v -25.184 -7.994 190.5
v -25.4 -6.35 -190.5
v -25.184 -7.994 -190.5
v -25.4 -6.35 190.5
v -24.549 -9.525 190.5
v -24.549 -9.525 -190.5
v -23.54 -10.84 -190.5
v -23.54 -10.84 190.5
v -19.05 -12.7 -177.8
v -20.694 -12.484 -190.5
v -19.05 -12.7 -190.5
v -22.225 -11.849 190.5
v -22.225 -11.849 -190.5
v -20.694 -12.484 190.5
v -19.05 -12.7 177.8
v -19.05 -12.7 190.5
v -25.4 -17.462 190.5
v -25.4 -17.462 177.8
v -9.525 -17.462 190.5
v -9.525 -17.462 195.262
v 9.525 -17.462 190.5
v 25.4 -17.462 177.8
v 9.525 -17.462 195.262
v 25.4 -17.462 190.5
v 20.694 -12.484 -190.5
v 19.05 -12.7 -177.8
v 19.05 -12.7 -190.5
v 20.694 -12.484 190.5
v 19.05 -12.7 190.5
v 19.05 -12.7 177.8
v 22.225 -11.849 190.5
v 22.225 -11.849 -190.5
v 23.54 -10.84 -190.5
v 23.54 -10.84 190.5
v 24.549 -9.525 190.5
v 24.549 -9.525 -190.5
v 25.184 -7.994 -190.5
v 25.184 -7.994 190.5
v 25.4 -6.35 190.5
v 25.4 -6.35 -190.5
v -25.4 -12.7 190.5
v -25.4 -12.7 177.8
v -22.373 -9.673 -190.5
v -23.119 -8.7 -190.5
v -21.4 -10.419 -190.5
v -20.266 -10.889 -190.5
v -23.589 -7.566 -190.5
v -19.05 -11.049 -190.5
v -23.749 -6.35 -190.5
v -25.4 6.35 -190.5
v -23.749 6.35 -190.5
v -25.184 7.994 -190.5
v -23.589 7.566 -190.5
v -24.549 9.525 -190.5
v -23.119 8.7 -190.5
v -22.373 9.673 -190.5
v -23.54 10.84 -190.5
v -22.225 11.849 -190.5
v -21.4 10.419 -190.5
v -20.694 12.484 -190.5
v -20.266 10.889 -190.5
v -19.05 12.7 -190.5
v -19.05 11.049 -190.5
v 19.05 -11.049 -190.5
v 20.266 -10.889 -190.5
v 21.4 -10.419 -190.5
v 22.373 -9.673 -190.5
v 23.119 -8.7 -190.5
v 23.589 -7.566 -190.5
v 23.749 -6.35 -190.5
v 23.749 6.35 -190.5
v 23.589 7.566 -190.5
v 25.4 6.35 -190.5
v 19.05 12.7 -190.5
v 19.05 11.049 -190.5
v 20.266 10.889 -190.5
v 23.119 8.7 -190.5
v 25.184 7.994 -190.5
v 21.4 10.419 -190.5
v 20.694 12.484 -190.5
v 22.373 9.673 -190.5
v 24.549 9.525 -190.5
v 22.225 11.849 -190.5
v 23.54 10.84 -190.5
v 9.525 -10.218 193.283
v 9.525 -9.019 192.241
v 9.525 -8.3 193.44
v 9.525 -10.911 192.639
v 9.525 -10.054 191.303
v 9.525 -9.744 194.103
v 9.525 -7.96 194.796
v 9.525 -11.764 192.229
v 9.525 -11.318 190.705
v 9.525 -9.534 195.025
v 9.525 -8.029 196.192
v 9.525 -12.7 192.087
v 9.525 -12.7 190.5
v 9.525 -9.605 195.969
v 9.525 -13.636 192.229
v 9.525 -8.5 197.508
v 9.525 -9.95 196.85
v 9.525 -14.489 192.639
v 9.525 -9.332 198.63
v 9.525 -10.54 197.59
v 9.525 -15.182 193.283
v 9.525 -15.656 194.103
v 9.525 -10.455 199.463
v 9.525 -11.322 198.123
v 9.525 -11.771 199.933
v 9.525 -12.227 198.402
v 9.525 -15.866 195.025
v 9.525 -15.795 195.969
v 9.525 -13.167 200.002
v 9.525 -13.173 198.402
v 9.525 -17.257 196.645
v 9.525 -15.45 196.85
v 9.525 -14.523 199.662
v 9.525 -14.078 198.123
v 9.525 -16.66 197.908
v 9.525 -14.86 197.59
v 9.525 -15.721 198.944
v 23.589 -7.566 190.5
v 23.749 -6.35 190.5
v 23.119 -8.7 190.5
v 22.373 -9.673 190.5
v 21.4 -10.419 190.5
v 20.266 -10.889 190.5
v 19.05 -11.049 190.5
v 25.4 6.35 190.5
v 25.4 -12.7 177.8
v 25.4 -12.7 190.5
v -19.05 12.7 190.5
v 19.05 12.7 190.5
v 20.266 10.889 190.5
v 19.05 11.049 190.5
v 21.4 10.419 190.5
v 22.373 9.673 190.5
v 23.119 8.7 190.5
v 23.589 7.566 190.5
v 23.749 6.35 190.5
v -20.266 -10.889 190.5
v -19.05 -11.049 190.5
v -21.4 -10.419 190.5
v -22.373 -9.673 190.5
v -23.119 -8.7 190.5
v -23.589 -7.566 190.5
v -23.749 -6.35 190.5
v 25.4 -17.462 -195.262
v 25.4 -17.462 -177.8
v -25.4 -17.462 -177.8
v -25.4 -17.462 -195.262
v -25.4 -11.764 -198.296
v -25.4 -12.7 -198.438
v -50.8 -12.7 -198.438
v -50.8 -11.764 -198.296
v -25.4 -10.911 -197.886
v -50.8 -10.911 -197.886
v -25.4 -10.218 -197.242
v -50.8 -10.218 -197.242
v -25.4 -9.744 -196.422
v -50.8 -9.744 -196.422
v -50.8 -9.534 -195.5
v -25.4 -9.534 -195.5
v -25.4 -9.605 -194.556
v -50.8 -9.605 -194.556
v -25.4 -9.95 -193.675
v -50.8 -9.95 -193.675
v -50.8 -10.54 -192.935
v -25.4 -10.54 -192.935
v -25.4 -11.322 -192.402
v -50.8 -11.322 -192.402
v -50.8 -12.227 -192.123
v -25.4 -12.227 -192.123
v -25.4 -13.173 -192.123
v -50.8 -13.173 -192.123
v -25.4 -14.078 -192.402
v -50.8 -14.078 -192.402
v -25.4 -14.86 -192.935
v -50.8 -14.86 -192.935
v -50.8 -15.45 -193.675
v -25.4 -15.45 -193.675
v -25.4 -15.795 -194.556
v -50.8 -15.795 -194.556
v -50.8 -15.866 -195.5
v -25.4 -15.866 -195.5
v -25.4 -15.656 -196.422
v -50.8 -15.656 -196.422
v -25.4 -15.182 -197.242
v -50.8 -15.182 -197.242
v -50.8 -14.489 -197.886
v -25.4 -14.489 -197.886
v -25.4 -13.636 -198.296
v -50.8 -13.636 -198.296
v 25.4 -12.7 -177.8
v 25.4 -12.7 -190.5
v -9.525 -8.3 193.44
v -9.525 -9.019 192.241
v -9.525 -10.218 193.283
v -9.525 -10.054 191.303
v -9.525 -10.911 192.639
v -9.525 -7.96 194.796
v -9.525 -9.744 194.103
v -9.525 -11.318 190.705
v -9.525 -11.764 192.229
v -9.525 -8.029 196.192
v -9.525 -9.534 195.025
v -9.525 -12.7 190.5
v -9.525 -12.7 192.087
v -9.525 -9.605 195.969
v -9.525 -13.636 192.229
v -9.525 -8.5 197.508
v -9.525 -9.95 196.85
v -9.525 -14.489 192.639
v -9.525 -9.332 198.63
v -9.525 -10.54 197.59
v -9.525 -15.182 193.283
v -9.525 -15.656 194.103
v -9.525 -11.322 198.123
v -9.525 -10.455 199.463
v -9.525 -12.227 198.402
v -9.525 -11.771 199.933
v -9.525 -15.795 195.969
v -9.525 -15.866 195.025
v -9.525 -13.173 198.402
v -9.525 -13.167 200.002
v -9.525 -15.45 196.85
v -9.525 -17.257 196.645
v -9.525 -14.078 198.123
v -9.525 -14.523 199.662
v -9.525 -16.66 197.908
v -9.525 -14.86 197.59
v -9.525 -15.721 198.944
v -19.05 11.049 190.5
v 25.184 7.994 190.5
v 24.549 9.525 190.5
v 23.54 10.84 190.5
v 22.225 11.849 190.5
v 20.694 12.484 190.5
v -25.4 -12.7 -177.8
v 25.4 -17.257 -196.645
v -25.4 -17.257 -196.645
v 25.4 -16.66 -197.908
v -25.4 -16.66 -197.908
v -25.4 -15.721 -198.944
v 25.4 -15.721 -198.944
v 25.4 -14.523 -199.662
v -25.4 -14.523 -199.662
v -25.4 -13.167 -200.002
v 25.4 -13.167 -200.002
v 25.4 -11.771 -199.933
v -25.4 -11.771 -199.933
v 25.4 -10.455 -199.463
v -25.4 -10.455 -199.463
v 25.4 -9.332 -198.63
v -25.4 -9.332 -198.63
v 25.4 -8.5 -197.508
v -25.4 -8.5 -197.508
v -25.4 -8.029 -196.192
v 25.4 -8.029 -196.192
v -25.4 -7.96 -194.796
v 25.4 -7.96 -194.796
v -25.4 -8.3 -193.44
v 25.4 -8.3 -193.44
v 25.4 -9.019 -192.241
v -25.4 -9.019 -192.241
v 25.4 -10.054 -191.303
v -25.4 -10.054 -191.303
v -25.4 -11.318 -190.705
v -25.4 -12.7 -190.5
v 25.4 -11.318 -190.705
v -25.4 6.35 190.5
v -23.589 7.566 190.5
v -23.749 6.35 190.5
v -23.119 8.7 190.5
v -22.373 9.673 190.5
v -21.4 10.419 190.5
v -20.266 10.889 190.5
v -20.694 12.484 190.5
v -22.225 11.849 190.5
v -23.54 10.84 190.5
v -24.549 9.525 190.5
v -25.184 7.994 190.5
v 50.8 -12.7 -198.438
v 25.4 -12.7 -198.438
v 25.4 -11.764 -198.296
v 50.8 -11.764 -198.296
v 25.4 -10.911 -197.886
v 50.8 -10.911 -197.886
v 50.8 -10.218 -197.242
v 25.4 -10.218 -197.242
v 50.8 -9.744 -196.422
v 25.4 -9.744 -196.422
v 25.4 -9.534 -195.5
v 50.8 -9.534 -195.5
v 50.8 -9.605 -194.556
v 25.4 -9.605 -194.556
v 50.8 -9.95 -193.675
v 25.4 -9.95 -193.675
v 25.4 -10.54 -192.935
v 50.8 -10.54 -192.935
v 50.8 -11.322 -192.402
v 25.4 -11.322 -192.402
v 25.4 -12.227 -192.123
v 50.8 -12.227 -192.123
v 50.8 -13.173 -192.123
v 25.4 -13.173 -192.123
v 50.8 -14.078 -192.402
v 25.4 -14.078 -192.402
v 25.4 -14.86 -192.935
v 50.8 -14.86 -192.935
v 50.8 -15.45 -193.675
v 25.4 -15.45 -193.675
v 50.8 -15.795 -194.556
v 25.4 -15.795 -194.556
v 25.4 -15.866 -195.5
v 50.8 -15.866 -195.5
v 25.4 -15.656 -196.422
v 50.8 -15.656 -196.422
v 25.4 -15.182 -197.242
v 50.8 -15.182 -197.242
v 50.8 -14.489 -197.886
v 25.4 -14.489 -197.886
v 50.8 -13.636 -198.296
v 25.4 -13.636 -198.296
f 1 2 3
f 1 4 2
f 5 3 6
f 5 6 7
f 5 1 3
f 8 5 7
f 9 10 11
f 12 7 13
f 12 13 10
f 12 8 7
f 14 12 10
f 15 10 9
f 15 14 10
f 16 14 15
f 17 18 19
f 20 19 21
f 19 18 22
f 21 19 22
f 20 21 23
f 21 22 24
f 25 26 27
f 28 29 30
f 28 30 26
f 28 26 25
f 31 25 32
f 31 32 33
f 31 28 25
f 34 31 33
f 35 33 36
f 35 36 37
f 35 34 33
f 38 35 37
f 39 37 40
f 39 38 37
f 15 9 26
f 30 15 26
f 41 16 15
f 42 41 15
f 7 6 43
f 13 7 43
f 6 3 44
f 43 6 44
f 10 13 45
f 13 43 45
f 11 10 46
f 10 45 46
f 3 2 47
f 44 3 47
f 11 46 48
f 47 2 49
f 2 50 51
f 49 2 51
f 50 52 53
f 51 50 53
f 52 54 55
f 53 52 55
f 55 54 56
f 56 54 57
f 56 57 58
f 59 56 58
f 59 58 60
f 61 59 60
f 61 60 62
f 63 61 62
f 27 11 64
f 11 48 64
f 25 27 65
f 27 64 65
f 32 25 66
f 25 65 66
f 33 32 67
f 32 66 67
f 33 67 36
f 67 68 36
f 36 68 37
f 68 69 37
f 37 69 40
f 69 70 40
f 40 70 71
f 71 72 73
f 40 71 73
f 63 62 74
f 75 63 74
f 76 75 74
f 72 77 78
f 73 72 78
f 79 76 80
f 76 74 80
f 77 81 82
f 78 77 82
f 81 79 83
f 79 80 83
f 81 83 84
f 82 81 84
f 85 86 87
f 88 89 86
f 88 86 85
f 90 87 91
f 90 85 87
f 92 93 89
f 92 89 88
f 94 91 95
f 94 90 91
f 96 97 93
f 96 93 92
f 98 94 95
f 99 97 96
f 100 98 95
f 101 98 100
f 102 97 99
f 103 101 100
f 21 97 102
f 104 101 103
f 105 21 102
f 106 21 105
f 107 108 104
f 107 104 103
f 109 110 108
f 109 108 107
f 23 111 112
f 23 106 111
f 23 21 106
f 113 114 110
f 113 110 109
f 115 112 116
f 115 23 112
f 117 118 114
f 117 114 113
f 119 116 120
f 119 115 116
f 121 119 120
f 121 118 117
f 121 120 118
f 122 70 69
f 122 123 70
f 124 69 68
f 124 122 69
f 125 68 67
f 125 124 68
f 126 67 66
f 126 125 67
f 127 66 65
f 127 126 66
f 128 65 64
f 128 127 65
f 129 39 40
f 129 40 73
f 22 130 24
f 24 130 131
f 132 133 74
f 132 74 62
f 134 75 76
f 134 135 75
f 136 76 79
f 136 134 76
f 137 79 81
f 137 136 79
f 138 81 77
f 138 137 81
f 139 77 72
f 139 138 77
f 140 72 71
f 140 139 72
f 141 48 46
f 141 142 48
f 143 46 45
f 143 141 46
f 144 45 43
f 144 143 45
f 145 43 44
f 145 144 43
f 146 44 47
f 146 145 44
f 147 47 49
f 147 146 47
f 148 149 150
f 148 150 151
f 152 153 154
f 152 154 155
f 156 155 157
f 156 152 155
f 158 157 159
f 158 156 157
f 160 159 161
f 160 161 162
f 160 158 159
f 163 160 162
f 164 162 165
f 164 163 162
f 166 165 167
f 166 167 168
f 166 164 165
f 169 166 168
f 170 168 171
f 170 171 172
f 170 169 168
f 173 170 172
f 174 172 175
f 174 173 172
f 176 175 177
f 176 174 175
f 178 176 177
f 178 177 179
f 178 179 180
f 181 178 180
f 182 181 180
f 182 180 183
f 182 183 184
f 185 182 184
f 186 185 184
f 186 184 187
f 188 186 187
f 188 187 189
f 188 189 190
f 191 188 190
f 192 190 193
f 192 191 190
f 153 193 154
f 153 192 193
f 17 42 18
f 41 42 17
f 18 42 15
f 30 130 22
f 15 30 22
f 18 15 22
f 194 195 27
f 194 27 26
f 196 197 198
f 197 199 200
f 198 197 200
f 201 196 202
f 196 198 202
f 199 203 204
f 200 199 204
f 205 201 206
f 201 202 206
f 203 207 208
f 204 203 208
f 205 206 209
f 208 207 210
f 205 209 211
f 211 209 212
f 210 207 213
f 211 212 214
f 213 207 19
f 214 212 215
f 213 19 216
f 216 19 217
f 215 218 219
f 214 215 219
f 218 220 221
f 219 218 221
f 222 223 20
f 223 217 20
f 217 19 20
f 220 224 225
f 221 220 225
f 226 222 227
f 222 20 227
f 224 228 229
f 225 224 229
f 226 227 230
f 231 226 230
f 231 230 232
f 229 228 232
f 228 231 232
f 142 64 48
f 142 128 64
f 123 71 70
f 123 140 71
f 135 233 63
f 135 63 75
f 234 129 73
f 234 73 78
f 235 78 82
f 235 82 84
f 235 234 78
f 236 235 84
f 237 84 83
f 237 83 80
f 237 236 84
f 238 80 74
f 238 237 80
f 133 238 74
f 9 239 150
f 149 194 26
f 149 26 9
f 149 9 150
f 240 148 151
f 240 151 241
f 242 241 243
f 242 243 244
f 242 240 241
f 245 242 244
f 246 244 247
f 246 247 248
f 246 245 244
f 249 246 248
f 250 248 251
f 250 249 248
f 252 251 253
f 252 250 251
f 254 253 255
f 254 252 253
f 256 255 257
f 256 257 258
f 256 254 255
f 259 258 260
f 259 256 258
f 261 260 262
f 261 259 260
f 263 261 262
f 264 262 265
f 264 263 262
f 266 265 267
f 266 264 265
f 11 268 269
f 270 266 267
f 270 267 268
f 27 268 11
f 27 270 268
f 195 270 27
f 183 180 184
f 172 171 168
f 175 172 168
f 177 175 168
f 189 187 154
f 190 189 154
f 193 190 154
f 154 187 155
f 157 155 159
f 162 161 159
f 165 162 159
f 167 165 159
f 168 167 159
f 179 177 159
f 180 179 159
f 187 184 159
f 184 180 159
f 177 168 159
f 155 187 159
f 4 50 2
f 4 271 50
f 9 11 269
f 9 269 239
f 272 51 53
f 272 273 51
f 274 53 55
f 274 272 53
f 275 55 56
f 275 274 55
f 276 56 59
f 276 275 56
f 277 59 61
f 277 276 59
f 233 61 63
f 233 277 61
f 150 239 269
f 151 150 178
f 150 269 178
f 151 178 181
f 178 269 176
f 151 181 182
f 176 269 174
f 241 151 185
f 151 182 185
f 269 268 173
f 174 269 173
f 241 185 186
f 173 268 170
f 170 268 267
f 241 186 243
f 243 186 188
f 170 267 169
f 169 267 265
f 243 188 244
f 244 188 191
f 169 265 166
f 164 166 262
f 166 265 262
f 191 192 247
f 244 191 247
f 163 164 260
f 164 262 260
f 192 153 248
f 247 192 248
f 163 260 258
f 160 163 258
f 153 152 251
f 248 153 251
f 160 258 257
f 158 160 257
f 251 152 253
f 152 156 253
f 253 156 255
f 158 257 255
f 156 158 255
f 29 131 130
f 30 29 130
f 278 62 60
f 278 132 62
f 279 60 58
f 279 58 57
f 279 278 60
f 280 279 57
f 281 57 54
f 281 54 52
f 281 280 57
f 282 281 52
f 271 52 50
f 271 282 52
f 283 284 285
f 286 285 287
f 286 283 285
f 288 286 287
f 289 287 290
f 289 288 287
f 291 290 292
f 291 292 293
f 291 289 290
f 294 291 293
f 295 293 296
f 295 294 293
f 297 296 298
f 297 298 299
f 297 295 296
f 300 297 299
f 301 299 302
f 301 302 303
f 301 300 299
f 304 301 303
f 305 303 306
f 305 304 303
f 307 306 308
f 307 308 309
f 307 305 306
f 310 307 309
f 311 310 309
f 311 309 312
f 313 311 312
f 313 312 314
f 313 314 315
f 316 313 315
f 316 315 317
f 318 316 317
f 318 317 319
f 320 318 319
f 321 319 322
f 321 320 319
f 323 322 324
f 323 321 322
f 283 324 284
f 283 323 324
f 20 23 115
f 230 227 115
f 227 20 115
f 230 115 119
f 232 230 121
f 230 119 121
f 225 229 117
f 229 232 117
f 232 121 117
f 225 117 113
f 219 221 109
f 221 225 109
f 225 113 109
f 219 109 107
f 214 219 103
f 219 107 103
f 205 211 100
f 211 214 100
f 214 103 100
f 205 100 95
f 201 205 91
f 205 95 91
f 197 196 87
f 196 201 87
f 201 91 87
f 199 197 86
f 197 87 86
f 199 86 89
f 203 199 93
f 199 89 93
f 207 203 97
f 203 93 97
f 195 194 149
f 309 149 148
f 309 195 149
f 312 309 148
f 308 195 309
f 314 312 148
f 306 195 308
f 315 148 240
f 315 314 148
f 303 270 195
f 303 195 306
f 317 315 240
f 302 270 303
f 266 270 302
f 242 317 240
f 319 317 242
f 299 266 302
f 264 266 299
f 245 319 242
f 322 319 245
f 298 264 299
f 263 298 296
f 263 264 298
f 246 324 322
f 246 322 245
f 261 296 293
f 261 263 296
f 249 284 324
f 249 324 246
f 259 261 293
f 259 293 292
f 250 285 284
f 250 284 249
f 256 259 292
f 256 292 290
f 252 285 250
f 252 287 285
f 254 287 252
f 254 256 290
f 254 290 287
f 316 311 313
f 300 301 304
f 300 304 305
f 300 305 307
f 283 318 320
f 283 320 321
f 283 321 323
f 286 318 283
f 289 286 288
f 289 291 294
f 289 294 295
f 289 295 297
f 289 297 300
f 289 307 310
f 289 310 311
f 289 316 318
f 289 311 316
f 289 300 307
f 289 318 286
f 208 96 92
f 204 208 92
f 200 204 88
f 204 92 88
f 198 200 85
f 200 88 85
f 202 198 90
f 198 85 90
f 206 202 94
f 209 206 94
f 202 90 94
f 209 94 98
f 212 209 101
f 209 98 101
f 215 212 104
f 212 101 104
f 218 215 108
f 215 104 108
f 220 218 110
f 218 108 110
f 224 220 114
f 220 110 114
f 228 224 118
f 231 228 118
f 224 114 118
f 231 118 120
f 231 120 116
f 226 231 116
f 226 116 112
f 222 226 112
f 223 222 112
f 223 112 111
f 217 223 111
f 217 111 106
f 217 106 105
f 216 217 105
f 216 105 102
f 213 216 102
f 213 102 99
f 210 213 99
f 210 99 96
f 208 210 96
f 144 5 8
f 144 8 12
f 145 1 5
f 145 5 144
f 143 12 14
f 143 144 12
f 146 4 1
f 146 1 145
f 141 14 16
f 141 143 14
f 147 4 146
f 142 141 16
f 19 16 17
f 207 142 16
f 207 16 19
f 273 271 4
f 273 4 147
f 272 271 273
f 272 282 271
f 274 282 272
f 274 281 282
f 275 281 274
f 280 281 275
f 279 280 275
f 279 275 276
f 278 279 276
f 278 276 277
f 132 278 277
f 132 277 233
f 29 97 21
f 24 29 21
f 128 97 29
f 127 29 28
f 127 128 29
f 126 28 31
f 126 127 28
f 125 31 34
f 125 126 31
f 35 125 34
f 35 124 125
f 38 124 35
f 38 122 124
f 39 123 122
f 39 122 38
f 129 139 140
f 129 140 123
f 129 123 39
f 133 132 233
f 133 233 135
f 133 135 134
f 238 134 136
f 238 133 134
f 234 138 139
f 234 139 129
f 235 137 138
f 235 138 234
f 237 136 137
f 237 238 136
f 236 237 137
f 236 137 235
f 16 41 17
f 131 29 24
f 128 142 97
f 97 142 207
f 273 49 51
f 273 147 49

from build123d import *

# Parameters (mm, degrees)
BOSS_EXTRUDE1_DEPTH = 190.5
BOSS_EXTRUDE2_DEPTH = 50.8
SKETCH3_R           = 3.175
BOSS_EXTRUDE3_DEPTH = 50.8
SKETCH4_W           = 15.875
SKETCH4_H           = 9.525
CUT_EXTRUDE1_DEPTH  = 31.1625
SKETCH5_R           = 3.175
CUT_EXTRUDE2_DEPTH  = 61.325


with BuildPart() as part:
    # Sketch1 → Boss-Extrude1 (new body, symmetric)
    with BuildSketch(Plane.XY):
        with BuildLine():
            Line((-19.05, -12.7), (19.05, -12.7))
            ThreePointArc((19.05, -12.7), (23.540128061, -10.840128061), (25.4, -6.35))
            Line((25.4, -6.35), (25.4, 6.35))
            ThreePointArc((25.4, 6.35), (23.540128061, 10.840128061), (19.05, 12.7))
            Line((19.05, 12.7), (-19.05, 12.7))
            ThreePointArc((-19.05, 12.7), (-23.540128061, 10.840128061), (-25.4, 6.35))
            Line((-25.4, 6.35), (-25.4, -6.35))
            ThreePointArc((-25.4, -6.35), (-23.540128061, -10.840128061), (-19.05, -12.7))
        make_face()
        with BuildLine():
            Line((-19.05, 11.049), (19.05, 11.049))
            ThreePointArc((19.05, 11.049), (22.372694765, 9.672694765), (23.749, 6.35))
            Line((23.749, 6.35), (23.749, -6.35))
            ThreePointArc((23.749, -6.35), (22.372694765, -9.672694765), (19.05, -11.049))
            Line((19.05, -11.049), (-19.05, -11.049))
            ThreePointArc((-19.05, -11.049), (-22.372694765, -9.672694765), (-23.749, -6.35))
            Line((-23.749, -6.35), (-23.749, 6.35))
            ThreePointArc((-23.749, 6.35), (-22.372694765, 9.672694765), (-19.05, 11.049))
        make_face(mode=Mode.SUBTRACT)
    extrude(amount=BOSS_EXTRUDE1_DEPTH, both=True)

    # Sketch2 → Boss-Extrude2 (add, through all)
    with BuildSketch(Plane(origin=(25.4, 0, 0), x_dir=(0, 0, -1), z_dir=(1, 0, 0))):
        with BuildLine():
            Line((177.8, -12.7), (177.8, -17.4625))
            Line((177.8, -17.4625), (195.2625, -17.4625))
            ThreePointArc((195.2625, -17.4625), (198.630096045, -9.332403955), (190.5, -12.7))
            Line((190.5, -12.7), (177.8, -12.7))
        make_face()
    boss_extrude2 = extrude(amount=-BOSS_EXTRUDE2_DEPTH)

    # Mirror1: Boss-Extrude2 across plane
    add(boss_extrude2.mirror(Plane.XY))

    # Sketch3 → Boss-Extrude3 (add, symmetric)
    with BuildSketch(Plane(origin=(0, 0, 0), x_dir=(0, 0, -1), z_dir=(1, 0, 0))):
        with Locations((195.2625, -12.7)):
            Circle(SKETCH3_R)
    extrude(amount=BOSS_EXTRUDE3_DEPTH, both=True)

    # Sketch4 → Cut-Extrude1 (cut, through all)
    with BuildSketch(Plane.XZ.offset(17.4625)):
        with Locations((-17.4625, 195.2625)):
            Rectangle(SKETCH4_W, SKETCH4_H)
        with Locations((17.4625, 195.2625)):
            Rectangle(SKETCH4_W, SKETCH4_H)
    extrude(amount=-CUT_EXTRUDE1_DEPTH, mode=Mode.SUBTRACT)

    # Sketch5 → Cut-Extrude2 (cut, through all)
    with BuildSketch(Plane(origin=(9.525, 0, 0), x_dir=(0, 0, -1), z_dir=(1, 0, 0))):
        with Locations((-195.2625, -12.7)):
            Circle(SKETCH5_R)
    extrude(amount=-CUT_EXTRUDE2_DEPTH, mode=Mode.SUBTRACT)


solid = part.part
